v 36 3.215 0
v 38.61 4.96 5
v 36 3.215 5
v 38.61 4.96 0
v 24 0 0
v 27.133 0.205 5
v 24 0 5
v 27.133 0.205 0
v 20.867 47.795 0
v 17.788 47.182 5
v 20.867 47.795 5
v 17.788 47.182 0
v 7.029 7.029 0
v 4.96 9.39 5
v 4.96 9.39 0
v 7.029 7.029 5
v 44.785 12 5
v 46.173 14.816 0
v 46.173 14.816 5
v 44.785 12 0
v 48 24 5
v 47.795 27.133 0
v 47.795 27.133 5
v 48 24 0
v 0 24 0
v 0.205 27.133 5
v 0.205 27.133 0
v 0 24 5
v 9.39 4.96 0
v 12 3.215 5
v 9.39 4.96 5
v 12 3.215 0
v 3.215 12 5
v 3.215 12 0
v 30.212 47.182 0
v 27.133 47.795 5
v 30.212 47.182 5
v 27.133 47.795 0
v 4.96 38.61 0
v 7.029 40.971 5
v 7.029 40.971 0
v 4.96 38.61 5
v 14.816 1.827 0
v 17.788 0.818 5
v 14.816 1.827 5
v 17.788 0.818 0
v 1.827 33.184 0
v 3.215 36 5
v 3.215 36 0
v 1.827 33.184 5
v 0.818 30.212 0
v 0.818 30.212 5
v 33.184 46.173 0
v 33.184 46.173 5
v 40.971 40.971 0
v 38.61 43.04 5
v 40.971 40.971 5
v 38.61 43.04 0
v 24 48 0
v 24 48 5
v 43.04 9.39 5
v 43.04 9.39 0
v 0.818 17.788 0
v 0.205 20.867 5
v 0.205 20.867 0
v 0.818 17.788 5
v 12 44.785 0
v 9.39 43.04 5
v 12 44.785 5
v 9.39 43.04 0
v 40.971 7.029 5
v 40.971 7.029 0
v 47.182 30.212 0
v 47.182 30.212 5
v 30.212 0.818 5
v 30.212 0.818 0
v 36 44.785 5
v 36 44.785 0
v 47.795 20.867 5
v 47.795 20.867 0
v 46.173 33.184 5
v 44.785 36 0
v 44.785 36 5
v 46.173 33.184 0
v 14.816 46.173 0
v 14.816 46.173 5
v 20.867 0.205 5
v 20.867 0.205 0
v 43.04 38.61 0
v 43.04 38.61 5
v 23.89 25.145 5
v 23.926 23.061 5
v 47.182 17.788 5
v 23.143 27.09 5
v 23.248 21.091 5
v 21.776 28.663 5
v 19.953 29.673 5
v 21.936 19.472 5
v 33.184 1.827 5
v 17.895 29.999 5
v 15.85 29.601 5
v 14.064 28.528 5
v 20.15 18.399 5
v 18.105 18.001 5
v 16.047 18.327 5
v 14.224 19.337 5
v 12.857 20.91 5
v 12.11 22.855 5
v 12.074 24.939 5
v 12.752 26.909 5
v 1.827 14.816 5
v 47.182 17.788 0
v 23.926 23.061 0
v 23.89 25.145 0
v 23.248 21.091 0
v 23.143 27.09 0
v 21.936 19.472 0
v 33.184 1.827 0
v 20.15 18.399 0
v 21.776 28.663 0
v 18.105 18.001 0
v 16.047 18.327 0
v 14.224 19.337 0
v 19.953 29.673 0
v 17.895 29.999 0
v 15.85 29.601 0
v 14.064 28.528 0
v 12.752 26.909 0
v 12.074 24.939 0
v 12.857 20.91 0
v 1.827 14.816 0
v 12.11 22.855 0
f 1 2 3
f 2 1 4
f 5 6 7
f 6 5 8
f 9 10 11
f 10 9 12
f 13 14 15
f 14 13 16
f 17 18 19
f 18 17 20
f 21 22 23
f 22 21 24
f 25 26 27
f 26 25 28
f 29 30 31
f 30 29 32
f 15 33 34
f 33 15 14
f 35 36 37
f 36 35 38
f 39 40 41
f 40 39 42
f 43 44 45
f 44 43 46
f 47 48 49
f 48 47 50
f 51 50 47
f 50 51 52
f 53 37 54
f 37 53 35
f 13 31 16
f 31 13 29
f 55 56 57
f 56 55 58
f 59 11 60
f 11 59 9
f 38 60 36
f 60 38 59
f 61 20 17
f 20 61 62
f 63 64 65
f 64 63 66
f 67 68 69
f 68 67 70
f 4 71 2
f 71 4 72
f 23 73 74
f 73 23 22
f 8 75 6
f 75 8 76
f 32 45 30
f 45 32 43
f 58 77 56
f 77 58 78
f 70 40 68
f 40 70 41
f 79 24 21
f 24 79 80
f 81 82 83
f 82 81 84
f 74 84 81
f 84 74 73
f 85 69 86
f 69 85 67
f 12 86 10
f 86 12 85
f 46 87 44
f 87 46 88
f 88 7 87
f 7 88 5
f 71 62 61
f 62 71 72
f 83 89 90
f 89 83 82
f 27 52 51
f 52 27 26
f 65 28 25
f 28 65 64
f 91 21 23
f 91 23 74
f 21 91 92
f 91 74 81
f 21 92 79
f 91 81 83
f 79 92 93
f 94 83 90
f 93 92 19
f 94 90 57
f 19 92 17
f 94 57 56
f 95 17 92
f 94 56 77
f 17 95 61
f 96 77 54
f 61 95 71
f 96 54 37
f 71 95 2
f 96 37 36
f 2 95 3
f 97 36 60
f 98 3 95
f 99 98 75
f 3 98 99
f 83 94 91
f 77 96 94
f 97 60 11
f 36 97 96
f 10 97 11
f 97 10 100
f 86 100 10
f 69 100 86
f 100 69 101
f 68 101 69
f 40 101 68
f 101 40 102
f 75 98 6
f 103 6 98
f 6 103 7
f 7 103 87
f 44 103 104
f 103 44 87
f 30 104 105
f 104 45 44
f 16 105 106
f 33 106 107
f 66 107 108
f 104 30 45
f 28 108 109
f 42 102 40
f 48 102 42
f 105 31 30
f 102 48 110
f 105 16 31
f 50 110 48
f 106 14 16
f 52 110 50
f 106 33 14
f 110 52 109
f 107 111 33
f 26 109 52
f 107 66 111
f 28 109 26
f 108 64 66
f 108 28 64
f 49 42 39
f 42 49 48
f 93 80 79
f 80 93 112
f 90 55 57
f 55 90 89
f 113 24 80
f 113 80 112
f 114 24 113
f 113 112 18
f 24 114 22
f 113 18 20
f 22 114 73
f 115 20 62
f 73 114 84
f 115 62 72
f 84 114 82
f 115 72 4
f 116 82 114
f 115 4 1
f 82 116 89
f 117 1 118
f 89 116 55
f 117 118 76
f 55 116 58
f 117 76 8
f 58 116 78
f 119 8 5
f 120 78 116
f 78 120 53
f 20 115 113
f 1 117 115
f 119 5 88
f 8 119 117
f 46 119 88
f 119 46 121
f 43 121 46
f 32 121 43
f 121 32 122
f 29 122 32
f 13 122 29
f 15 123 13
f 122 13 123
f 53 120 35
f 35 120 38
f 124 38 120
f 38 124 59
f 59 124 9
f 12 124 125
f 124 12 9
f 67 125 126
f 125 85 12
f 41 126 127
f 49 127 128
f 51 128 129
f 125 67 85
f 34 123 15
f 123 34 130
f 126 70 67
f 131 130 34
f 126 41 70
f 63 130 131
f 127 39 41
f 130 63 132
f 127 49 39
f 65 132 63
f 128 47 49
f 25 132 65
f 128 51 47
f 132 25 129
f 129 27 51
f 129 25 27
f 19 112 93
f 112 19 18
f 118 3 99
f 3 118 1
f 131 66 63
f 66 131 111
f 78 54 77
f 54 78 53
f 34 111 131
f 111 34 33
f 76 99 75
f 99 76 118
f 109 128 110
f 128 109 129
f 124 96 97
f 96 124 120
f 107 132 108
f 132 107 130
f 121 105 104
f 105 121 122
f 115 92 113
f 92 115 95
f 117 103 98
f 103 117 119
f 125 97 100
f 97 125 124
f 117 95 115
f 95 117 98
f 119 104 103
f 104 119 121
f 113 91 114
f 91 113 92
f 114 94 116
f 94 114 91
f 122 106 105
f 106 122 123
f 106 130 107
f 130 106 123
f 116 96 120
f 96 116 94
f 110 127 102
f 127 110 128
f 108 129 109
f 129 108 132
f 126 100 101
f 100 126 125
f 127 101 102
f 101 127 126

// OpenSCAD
$fn = 32;

// ----------------------------------------------------------------------
// Cam plate: eccentric cam, base R24
// ----------------------------------------------------------------------

// --- parameters (mm) ---
base_r = 24;              // base circle radius
lobe_h = 10;              // cam lobe rise
bore_r = 6;               // shaft bore radius
plate_t = 5;              // plate thickness, Z (extrusion height)
ecc = 6;                  // disc eccentricity

profile = [[48, 24], [47.795, 27.133], [47.182, 30.212], [46.173, 33.184], [44.785, 36], [43.04, 38.61], [40.971, 40.971], [38.61, 43.04], [36, 44.785], [33.184, 46.173], [30.212, 47.182], [27.133, 47.795], [24, 48], [20.867, 47.795], [17.788, 47.182], [14.816, 46.173], [12, 44.785], [9.39, 43.04], [7.029, 40.971], [4.96, 38.61], [3.215, 36], [1.827, 33.184], [0.818, 30.212], [0.205, 27.133], [0, 24], [0.205, 20.867], [0.818, 17.788], [1.827, 14.816], [3.215, 12], [4.96, 9.39], [7.029, 7.029], [9.39, 4.96], [12, 3.215], [14.816, 1.827], [17.788, 0.818], [20.867, 0.205], [24, 0], [27.133, 0.205], [30.212, 0.818], [33.184, 1.827], [36, 3.215], [38.61, 4.96], [40.971, 7.029], [43.04, 9.39], [44.785, 12], [46.173, 14.816], [47.182, 17.788], [47.795, 20.867]];  // primary outline, 48 points, counter clockwise
void_1 = [[23.89, 25.145], [23.143, 27.09], [21.776, 28.663], [19.953, 29.673], [17.895, 29.999], [15.85, 29.601], [14.064, 28.528], [12.752, 26.909], [12.074, 24.939], [12.11, 22.855], [12.857, 20.91], [14.224, 19.337], [16.047, 18.327], [18.105, 18.001], [20.15, 18.399], [21.936, 19.472], [23.248, 21.091], [23.926, 23.061]];  // shaft bore, 18 points

// --- the one profile operation ---
difference() {
  linear_extrude(height = plate_t) polygon(points = profile);
  translate([0, 0, -1])
    linear_extrude(height = plate_t + 2) polygon(points = void_1);
}
